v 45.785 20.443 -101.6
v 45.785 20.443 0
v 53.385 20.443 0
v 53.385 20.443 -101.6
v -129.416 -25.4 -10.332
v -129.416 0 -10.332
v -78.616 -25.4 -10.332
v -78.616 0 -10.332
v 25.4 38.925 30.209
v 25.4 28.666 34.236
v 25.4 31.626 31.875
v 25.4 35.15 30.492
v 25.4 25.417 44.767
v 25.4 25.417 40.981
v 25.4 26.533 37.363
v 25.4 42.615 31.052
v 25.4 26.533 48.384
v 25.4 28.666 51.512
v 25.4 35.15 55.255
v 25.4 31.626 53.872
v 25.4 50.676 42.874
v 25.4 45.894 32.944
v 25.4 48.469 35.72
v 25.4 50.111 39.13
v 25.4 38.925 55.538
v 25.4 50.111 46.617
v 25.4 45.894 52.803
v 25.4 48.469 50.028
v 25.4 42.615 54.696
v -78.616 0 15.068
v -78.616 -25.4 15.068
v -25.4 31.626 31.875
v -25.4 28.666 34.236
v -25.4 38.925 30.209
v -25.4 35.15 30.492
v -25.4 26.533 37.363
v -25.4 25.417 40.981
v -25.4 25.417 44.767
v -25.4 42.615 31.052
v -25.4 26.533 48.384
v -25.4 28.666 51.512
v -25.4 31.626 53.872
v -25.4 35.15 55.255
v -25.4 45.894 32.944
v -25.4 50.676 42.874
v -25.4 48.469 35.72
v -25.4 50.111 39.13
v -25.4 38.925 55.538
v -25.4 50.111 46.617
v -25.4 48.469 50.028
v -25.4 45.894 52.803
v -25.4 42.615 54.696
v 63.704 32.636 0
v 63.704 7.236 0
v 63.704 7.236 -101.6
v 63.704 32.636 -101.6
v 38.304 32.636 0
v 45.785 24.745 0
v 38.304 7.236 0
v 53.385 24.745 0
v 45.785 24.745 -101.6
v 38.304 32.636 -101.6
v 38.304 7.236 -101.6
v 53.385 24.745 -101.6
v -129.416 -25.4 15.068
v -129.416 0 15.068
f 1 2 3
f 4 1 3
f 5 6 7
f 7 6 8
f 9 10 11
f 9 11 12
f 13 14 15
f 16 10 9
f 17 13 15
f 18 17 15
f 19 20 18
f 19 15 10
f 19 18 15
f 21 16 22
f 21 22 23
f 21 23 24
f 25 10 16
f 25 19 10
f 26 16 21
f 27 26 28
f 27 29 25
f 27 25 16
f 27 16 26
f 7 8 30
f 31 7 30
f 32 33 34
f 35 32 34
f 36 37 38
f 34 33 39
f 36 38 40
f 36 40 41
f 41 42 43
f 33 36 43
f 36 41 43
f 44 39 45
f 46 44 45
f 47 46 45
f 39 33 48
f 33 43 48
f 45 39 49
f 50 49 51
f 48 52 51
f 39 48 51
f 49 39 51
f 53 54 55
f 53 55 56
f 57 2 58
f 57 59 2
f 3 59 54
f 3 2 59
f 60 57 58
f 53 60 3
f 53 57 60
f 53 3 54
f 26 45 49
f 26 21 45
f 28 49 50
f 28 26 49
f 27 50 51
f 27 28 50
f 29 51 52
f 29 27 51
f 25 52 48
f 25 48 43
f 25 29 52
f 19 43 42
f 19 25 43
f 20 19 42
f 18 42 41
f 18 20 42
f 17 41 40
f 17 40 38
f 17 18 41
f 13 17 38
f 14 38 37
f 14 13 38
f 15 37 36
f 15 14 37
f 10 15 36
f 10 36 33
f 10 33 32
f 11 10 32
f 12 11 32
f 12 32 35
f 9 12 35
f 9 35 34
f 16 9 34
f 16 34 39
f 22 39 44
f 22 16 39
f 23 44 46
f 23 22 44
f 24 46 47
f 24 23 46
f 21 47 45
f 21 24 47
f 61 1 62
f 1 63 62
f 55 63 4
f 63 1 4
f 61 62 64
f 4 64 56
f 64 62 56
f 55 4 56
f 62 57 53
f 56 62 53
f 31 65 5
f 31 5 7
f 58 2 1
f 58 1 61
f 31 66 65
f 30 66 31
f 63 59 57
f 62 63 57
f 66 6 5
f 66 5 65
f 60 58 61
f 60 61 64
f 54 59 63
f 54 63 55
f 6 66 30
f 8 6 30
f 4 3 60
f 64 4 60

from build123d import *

# Parameters (mm, degrees)
F0_W     = 50.8
F0_H     = 25.4
F1_DEPTH = 25.4
F2_W     = 25.4
F2_H     = 25.4
F2_W_2   = 7.600162
F2_H_2   = 4.301813
F3_DEPTH = 101.6
F4_R     = 12.7
F5_DEPTH = 25.4
F6_DEPTH = 25.4


with BuildPart() as f1:
    # F0 (on Front) → F1 (new body)
    with BuildSketch(Plane.XZ):
        with Locations((-104.015551, 2.367632)):
            Rectangle(F0_W, F0_H)
    extrude(amount=F1_DEPTH)


with BuildPart() as f3:
    # F2 (on Top) → F3 (new body)
    with BuildSketch(Plane.XY):
        with Locations((51.004363, 19.9357)):
            Rectangle(F2_W, F2_H)
        with Locations((49.584674, 22.593917)):
            Rectangle(F2_W_2, F2_H_2, mode=Mode.SUBTRACT)
    extrude(amount=-F3_DEPTH)


with BuildPart() as f5:
    # F4 (on Right) → F5 (new body)
    with BuildSketch(Plane.YZ):
        with Locations((37.975639, 42.87371)):
            Circle(F4_R)
    extrude(amount=F5_DEPTH)

    # F4 (on Right) → F6 (join)
    with BuildSketch(Plane.YZ):
        with Locations((37.975639, 42.87371)):
            Circle(F4_R)
    extrude(amount=-F6_DEPTH)


solid = Compound([f1.part, f3.part, f5.part])
